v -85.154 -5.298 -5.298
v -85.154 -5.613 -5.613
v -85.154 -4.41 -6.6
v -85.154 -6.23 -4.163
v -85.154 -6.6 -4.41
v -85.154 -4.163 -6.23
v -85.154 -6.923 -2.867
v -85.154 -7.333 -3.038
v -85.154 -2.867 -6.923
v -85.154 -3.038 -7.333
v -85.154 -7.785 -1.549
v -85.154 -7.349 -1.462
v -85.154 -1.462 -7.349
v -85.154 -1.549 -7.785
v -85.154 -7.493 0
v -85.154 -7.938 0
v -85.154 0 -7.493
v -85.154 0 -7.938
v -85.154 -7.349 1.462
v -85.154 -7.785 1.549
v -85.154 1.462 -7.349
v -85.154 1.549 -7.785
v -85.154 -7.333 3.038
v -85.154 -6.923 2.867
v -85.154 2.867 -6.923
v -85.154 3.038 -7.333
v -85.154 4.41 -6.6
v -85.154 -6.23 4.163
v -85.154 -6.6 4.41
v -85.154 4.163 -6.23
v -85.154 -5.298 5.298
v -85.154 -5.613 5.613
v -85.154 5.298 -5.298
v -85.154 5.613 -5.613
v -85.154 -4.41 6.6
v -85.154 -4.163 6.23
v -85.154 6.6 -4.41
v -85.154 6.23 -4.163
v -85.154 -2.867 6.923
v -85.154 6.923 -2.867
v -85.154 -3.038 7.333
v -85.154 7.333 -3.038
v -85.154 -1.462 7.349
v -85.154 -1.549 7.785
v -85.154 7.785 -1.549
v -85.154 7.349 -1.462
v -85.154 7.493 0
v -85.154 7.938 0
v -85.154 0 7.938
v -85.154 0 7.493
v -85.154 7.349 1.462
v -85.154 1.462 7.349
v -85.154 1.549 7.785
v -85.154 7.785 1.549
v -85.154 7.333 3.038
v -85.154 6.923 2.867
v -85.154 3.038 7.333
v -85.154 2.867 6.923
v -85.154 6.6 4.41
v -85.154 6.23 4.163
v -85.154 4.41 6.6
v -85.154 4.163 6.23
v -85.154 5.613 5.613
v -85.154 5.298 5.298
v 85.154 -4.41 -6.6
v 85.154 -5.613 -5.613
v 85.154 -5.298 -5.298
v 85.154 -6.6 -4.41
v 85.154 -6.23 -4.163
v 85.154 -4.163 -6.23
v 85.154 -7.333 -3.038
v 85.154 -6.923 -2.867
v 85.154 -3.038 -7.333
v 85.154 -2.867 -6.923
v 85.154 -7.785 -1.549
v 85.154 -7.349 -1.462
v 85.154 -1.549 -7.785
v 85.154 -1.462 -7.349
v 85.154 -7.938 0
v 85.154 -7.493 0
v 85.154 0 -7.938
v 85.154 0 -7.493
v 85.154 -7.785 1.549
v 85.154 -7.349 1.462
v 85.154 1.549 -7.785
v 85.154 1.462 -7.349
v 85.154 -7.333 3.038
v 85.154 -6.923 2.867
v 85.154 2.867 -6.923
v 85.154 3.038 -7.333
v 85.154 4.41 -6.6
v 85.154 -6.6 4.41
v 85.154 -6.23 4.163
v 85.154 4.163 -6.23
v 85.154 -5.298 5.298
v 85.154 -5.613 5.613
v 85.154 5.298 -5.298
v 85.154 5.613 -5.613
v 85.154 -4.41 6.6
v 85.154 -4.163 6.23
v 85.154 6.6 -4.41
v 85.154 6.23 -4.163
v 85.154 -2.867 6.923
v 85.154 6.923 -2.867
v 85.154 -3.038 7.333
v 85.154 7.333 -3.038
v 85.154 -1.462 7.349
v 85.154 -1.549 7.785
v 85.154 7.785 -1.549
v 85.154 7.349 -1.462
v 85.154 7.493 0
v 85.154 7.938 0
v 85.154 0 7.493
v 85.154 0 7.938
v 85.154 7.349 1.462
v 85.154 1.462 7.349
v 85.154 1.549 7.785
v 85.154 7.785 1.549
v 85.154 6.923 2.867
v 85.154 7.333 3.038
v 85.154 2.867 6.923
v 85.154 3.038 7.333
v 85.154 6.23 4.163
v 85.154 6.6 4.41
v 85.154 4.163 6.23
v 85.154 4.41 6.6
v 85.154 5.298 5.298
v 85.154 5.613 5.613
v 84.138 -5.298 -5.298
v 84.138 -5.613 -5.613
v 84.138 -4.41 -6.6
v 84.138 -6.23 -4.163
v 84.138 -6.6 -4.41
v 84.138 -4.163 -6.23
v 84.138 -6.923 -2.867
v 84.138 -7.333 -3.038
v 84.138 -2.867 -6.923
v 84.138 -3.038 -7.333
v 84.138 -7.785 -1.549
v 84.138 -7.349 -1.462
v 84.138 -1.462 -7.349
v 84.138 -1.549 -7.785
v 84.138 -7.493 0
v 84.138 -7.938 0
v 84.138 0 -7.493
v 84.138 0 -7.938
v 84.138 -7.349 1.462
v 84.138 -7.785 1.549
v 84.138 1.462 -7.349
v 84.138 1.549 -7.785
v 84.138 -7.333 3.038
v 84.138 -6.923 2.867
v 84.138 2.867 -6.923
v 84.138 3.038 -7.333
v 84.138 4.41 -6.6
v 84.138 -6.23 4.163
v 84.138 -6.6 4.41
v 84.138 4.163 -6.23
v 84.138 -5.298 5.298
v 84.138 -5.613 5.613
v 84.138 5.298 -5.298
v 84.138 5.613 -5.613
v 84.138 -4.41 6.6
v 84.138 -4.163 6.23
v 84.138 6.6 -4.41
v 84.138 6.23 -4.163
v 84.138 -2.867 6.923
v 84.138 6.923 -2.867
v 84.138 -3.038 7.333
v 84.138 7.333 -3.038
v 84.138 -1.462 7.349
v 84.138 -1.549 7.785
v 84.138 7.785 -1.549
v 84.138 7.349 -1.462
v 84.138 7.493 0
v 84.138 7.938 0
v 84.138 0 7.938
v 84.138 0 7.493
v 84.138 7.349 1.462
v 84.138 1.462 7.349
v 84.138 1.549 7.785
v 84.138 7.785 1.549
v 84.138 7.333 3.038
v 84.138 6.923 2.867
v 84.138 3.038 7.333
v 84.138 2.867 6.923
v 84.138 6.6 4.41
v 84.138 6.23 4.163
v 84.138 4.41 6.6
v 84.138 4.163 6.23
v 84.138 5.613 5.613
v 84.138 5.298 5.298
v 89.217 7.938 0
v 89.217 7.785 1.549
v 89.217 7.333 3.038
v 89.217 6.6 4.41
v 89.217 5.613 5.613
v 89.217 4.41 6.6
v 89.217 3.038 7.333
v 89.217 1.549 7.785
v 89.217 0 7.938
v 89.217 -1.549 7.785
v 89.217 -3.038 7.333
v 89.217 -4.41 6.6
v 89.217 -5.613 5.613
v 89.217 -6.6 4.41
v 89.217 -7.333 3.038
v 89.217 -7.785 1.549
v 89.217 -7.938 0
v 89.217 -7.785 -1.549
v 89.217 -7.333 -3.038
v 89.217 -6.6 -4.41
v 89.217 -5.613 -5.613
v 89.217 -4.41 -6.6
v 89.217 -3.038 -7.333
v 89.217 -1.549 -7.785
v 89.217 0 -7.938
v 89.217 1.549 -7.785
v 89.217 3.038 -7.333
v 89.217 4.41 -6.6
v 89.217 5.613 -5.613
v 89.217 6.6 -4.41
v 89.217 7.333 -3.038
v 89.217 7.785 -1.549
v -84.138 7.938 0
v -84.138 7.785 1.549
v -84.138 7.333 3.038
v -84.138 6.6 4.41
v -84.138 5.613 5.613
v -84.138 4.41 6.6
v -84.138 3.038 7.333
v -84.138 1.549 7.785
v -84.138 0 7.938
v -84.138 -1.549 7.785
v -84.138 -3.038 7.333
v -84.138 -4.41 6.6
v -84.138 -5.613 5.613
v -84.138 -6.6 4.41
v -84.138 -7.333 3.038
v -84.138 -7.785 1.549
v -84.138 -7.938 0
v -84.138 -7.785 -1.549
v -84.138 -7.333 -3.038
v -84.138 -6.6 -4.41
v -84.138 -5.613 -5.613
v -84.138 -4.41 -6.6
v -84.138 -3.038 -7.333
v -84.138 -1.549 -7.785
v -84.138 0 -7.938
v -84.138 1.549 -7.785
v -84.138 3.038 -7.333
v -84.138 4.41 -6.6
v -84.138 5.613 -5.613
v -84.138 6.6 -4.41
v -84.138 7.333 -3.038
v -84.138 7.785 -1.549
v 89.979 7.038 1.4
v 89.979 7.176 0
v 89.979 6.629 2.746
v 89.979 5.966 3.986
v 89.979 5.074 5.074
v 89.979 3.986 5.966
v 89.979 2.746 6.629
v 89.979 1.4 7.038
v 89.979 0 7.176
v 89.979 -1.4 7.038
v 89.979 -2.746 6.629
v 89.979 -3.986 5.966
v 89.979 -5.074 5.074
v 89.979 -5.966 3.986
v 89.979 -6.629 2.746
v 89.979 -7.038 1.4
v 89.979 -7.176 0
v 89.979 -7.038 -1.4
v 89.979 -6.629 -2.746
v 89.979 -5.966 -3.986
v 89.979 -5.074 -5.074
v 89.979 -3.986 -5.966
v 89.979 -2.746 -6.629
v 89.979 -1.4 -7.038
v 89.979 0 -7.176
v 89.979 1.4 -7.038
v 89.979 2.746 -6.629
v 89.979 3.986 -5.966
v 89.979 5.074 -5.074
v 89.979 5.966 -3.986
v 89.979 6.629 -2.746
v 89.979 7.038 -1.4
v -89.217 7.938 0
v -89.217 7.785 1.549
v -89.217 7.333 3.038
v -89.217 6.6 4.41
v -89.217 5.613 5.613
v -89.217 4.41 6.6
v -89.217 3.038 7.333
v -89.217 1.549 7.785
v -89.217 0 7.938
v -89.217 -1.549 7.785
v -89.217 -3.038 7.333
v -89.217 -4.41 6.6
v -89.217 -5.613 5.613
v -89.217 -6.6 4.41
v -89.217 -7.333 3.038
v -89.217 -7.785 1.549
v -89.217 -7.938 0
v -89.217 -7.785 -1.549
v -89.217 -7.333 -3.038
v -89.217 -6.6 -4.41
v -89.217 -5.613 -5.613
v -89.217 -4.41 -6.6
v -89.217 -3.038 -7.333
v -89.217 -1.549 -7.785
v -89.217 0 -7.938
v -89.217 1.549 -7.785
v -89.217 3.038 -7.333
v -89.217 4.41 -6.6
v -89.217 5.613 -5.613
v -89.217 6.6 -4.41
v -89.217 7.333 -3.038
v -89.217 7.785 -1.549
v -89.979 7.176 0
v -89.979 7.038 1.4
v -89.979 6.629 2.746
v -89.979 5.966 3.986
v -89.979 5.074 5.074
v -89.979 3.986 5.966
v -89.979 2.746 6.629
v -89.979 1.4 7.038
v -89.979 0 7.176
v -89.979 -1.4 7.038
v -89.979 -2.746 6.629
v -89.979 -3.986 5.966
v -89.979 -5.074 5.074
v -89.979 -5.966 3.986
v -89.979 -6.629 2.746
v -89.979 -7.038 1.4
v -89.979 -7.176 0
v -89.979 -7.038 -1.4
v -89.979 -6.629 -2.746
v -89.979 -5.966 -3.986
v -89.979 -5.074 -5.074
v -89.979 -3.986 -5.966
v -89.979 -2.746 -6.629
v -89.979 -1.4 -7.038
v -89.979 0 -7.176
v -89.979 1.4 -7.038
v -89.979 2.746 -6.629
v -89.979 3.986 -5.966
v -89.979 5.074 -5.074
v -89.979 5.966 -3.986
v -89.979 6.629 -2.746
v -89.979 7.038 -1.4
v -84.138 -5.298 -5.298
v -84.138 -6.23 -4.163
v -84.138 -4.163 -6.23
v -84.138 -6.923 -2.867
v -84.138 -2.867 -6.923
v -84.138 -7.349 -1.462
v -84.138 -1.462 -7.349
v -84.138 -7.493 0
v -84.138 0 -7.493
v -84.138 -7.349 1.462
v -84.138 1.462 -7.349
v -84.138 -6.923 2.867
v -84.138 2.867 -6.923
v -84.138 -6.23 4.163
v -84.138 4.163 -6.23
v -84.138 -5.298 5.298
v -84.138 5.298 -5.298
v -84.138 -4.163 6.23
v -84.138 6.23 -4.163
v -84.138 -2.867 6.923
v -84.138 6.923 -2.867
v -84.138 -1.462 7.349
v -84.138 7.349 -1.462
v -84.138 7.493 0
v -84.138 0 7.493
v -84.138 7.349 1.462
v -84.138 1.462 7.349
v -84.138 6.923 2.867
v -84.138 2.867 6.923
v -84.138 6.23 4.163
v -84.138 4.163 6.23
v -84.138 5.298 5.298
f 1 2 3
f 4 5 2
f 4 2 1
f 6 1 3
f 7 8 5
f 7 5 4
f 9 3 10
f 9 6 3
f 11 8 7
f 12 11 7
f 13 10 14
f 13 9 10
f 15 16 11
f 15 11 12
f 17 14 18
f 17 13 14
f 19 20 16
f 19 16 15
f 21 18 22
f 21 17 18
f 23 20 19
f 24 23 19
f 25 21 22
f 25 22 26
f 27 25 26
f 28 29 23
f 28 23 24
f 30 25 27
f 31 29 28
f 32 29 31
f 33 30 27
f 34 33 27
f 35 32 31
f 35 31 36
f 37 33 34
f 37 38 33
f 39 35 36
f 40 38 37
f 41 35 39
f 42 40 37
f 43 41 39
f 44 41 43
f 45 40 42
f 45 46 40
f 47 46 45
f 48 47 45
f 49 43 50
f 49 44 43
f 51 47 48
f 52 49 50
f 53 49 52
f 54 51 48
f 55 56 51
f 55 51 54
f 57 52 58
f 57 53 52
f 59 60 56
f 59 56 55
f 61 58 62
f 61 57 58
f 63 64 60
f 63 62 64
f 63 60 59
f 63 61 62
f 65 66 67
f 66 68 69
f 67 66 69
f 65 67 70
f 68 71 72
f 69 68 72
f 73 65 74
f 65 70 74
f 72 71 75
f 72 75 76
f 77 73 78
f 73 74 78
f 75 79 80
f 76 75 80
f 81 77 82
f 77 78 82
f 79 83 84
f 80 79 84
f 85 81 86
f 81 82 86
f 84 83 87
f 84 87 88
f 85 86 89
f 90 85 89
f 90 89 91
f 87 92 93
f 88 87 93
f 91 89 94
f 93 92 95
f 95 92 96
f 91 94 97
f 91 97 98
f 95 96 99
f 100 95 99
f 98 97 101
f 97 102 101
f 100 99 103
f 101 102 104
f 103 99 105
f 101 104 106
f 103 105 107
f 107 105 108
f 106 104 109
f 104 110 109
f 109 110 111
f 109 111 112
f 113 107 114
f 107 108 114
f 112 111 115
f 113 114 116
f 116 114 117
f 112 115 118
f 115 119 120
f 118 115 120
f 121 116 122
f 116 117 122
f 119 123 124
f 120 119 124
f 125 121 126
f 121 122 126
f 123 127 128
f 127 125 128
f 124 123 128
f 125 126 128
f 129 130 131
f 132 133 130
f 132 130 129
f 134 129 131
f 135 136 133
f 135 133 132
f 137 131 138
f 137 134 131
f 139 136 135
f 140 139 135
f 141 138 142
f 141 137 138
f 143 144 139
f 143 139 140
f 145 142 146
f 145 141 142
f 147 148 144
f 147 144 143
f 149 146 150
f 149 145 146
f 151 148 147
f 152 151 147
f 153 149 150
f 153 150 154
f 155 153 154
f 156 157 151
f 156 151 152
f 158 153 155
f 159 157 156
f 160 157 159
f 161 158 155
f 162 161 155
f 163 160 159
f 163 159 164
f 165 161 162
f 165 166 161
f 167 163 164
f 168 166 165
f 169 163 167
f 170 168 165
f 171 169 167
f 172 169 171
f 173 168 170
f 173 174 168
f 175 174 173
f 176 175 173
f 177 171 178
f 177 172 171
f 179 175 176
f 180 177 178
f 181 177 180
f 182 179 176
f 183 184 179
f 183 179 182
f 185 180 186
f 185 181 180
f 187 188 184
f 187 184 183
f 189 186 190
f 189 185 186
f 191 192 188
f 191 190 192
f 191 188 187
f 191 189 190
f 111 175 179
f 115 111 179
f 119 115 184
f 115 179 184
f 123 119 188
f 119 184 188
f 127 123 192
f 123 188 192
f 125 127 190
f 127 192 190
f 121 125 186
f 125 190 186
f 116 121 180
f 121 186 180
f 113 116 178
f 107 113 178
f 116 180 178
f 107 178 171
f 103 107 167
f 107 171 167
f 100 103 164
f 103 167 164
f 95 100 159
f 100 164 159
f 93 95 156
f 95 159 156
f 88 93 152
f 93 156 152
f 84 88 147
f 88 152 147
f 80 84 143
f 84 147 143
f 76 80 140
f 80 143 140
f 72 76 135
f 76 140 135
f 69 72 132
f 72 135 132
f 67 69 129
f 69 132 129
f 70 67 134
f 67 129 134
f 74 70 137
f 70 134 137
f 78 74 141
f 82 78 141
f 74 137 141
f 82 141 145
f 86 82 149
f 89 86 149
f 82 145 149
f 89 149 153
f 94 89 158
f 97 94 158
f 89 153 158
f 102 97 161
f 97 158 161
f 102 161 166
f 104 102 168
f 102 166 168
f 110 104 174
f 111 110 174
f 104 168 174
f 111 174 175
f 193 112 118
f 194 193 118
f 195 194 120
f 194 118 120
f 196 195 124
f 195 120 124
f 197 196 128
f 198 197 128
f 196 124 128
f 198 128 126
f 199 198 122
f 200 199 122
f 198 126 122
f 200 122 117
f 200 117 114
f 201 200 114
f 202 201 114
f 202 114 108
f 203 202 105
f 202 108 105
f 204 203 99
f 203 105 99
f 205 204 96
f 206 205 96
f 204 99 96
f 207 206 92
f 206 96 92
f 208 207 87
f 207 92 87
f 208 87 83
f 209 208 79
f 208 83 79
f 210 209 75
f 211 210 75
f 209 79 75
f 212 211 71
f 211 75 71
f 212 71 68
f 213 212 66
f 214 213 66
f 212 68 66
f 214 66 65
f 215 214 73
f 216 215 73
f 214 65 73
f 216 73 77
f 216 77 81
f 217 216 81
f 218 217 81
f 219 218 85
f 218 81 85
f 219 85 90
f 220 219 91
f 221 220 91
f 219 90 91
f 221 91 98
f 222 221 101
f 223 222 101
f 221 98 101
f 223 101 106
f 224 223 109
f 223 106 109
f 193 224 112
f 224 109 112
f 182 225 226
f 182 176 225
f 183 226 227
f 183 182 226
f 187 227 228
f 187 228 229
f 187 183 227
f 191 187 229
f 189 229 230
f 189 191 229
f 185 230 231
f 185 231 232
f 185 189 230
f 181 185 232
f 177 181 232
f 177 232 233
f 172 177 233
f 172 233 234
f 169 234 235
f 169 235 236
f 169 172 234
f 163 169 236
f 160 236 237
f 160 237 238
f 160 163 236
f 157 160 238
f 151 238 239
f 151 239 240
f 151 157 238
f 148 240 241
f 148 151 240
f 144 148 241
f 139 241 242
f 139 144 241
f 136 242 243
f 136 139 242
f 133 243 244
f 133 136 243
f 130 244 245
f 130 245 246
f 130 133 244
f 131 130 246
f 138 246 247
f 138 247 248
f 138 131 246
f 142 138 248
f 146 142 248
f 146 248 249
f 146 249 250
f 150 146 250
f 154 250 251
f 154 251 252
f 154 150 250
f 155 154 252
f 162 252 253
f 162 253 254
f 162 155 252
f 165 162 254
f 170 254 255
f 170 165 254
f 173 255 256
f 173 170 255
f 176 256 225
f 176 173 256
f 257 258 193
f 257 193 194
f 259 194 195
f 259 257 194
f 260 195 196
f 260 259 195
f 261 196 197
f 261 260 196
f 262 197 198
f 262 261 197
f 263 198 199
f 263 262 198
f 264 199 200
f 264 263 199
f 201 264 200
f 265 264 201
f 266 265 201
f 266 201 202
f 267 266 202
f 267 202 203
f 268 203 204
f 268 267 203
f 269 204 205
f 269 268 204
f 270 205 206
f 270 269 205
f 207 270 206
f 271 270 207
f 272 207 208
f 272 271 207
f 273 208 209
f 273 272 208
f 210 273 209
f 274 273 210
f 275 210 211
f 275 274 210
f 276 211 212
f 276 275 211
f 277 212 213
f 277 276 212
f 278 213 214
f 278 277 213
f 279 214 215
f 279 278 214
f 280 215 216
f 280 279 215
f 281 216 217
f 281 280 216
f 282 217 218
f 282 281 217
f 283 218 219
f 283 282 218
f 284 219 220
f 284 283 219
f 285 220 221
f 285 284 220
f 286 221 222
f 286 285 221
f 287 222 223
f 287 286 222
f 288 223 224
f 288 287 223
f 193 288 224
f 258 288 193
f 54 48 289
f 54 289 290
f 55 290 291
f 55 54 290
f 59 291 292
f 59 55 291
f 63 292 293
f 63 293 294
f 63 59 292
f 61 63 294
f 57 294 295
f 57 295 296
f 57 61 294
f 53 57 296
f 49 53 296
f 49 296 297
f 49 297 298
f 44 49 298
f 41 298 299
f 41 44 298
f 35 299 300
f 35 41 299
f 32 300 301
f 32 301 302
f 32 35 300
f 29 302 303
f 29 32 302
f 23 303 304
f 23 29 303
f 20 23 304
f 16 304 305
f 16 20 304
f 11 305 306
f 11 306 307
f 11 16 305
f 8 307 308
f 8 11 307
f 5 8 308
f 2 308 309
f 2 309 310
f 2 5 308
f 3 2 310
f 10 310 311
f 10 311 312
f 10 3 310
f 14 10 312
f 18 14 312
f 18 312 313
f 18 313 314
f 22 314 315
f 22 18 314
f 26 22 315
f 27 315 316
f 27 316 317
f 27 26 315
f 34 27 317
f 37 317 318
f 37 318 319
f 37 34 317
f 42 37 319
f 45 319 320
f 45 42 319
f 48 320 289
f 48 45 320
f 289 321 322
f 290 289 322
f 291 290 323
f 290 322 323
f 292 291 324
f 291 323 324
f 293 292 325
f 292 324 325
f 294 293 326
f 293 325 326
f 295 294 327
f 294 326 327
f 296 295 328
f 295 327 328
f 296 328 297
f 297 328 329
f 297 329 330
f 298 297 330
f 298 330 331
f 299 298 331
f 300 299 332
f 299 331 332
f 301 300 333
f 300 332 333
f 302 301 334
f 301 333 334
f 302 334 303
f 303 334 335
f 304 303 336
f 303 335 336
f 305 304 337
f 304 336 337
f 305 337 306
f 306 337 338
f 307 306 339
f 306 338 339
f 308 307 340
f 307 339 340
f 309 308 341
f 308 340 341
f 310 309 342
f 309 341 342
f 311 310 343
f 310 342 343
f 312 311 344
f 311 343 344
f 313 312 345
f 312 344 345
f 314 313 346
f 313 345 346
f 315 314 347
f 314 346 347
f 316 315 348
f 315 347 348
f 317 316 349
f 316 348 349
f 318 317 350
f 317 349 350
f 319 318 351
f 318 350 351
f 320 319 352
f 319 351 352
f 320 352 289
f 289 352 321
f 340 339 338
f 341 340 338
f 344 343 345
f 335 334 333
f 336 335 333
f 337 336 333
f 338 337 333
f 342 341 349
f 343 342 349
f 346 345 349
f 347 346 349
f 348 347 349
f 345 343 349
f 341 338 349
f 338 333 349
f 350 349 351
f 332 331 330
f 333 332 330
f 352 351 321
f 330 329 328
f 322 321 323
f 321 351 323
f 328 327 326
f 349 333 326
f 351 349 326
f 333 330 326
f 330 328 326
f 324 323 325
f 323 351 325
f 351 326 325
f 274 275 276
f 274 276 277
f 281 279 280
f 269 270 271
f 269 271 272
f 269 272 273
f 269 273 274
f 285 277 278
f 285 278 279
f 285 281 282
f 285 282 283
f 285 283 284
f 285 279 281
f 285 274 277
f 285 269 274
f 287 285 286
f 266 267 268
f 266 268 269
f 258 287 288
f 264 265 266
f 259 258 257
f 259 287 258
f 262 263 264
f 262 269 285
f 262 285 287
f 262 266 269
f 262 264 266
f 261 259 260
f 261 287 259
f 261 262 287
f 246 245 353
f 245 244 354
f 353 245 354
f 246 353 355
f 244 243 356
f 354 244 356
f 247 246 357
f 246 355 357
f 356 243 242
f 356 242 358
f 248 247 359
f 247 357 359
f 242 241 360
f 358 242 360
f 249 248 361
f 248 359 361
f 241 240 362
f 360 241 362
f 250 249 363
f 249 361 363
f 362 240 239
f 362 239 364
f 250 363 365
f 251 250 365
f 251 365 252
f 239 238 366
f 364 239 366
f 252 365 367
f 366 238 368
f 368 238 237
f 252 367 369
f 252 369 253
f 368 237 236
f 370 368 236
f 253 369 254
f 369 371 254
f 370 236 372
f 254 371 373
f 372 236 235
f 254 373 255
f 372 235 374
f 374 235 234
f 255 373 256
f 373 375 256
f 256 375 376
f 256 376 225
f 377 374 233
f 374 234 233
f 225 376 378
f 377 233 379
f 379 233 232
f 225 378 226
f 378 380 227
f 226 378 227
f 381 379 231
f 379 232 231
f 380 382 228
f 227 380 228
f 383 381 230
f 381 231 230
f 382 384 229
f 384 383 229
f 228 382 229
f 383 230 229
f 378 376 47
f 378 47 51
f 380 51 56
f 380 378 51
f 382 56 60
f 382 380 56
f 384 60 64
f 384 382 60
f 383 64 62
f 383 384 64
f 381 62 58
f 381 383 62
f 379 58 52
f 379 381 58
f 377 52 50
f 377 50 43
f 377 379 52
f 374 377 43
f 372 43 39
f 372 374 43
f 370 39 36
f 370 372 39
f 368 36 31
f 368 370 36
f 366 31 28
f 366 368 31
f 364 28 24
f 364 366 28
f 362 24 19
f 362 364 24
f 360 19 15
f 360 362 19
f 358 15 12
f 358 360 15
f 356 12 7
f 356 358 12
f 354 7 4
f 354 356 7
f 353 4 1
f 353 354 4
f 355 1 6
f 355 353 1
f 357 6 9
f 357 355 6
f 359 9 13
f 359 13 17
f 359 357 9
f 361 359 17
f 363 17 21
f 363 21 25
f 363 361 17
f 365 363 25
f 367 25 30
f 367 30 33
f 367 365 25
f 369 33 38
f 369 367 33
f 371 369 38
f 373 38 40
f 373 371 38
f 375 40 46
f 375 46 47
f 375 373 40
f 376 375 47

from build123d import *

# Parameters (mm, degrees)
F0_R     = 7.9375
F1_DEPTH = 84.1375
F2_R     = 7.493
F3_DEPTH = 1.016
F4_R     = 7.9375
F5_DEPTH = 4.826
F6_SIZE  = 0.762


with BuildPart() as f1:
    # F0 (on Right) → F1 (new body, symmetric)
    with BuildSketch(Plane.YZ):
        Circle(F0_R)
    extrude(amount=F1_DEPTH, both=True)

    # F2 (on face) → F3 (join)
    with BuildSketch(Plane.YZ.offset(84.1375)):
        Circle(F2_R)
    extrude(amount=F3_DEPTH)

    # F4 (on face) → F5 (join)
    with BuildSketch(Plane.YZ.offset(85.1535)):
        Circle(F4_R)
    extrude(amount=F5_DEPTH)

    # F6
    f6_edges = [f1.edges().sort_by_distance(p)[0] for p in [
        (89.9795, -7.9375, 0),
    ]]
    chamfer(f6_edges, length=F6_SIZE)

    # F7: F1 across plane


with BuildPart() as f1_1:
    add(f1.part)
    add(f1.part.mirror(Plane.YZ))


solid = f1_1.part
